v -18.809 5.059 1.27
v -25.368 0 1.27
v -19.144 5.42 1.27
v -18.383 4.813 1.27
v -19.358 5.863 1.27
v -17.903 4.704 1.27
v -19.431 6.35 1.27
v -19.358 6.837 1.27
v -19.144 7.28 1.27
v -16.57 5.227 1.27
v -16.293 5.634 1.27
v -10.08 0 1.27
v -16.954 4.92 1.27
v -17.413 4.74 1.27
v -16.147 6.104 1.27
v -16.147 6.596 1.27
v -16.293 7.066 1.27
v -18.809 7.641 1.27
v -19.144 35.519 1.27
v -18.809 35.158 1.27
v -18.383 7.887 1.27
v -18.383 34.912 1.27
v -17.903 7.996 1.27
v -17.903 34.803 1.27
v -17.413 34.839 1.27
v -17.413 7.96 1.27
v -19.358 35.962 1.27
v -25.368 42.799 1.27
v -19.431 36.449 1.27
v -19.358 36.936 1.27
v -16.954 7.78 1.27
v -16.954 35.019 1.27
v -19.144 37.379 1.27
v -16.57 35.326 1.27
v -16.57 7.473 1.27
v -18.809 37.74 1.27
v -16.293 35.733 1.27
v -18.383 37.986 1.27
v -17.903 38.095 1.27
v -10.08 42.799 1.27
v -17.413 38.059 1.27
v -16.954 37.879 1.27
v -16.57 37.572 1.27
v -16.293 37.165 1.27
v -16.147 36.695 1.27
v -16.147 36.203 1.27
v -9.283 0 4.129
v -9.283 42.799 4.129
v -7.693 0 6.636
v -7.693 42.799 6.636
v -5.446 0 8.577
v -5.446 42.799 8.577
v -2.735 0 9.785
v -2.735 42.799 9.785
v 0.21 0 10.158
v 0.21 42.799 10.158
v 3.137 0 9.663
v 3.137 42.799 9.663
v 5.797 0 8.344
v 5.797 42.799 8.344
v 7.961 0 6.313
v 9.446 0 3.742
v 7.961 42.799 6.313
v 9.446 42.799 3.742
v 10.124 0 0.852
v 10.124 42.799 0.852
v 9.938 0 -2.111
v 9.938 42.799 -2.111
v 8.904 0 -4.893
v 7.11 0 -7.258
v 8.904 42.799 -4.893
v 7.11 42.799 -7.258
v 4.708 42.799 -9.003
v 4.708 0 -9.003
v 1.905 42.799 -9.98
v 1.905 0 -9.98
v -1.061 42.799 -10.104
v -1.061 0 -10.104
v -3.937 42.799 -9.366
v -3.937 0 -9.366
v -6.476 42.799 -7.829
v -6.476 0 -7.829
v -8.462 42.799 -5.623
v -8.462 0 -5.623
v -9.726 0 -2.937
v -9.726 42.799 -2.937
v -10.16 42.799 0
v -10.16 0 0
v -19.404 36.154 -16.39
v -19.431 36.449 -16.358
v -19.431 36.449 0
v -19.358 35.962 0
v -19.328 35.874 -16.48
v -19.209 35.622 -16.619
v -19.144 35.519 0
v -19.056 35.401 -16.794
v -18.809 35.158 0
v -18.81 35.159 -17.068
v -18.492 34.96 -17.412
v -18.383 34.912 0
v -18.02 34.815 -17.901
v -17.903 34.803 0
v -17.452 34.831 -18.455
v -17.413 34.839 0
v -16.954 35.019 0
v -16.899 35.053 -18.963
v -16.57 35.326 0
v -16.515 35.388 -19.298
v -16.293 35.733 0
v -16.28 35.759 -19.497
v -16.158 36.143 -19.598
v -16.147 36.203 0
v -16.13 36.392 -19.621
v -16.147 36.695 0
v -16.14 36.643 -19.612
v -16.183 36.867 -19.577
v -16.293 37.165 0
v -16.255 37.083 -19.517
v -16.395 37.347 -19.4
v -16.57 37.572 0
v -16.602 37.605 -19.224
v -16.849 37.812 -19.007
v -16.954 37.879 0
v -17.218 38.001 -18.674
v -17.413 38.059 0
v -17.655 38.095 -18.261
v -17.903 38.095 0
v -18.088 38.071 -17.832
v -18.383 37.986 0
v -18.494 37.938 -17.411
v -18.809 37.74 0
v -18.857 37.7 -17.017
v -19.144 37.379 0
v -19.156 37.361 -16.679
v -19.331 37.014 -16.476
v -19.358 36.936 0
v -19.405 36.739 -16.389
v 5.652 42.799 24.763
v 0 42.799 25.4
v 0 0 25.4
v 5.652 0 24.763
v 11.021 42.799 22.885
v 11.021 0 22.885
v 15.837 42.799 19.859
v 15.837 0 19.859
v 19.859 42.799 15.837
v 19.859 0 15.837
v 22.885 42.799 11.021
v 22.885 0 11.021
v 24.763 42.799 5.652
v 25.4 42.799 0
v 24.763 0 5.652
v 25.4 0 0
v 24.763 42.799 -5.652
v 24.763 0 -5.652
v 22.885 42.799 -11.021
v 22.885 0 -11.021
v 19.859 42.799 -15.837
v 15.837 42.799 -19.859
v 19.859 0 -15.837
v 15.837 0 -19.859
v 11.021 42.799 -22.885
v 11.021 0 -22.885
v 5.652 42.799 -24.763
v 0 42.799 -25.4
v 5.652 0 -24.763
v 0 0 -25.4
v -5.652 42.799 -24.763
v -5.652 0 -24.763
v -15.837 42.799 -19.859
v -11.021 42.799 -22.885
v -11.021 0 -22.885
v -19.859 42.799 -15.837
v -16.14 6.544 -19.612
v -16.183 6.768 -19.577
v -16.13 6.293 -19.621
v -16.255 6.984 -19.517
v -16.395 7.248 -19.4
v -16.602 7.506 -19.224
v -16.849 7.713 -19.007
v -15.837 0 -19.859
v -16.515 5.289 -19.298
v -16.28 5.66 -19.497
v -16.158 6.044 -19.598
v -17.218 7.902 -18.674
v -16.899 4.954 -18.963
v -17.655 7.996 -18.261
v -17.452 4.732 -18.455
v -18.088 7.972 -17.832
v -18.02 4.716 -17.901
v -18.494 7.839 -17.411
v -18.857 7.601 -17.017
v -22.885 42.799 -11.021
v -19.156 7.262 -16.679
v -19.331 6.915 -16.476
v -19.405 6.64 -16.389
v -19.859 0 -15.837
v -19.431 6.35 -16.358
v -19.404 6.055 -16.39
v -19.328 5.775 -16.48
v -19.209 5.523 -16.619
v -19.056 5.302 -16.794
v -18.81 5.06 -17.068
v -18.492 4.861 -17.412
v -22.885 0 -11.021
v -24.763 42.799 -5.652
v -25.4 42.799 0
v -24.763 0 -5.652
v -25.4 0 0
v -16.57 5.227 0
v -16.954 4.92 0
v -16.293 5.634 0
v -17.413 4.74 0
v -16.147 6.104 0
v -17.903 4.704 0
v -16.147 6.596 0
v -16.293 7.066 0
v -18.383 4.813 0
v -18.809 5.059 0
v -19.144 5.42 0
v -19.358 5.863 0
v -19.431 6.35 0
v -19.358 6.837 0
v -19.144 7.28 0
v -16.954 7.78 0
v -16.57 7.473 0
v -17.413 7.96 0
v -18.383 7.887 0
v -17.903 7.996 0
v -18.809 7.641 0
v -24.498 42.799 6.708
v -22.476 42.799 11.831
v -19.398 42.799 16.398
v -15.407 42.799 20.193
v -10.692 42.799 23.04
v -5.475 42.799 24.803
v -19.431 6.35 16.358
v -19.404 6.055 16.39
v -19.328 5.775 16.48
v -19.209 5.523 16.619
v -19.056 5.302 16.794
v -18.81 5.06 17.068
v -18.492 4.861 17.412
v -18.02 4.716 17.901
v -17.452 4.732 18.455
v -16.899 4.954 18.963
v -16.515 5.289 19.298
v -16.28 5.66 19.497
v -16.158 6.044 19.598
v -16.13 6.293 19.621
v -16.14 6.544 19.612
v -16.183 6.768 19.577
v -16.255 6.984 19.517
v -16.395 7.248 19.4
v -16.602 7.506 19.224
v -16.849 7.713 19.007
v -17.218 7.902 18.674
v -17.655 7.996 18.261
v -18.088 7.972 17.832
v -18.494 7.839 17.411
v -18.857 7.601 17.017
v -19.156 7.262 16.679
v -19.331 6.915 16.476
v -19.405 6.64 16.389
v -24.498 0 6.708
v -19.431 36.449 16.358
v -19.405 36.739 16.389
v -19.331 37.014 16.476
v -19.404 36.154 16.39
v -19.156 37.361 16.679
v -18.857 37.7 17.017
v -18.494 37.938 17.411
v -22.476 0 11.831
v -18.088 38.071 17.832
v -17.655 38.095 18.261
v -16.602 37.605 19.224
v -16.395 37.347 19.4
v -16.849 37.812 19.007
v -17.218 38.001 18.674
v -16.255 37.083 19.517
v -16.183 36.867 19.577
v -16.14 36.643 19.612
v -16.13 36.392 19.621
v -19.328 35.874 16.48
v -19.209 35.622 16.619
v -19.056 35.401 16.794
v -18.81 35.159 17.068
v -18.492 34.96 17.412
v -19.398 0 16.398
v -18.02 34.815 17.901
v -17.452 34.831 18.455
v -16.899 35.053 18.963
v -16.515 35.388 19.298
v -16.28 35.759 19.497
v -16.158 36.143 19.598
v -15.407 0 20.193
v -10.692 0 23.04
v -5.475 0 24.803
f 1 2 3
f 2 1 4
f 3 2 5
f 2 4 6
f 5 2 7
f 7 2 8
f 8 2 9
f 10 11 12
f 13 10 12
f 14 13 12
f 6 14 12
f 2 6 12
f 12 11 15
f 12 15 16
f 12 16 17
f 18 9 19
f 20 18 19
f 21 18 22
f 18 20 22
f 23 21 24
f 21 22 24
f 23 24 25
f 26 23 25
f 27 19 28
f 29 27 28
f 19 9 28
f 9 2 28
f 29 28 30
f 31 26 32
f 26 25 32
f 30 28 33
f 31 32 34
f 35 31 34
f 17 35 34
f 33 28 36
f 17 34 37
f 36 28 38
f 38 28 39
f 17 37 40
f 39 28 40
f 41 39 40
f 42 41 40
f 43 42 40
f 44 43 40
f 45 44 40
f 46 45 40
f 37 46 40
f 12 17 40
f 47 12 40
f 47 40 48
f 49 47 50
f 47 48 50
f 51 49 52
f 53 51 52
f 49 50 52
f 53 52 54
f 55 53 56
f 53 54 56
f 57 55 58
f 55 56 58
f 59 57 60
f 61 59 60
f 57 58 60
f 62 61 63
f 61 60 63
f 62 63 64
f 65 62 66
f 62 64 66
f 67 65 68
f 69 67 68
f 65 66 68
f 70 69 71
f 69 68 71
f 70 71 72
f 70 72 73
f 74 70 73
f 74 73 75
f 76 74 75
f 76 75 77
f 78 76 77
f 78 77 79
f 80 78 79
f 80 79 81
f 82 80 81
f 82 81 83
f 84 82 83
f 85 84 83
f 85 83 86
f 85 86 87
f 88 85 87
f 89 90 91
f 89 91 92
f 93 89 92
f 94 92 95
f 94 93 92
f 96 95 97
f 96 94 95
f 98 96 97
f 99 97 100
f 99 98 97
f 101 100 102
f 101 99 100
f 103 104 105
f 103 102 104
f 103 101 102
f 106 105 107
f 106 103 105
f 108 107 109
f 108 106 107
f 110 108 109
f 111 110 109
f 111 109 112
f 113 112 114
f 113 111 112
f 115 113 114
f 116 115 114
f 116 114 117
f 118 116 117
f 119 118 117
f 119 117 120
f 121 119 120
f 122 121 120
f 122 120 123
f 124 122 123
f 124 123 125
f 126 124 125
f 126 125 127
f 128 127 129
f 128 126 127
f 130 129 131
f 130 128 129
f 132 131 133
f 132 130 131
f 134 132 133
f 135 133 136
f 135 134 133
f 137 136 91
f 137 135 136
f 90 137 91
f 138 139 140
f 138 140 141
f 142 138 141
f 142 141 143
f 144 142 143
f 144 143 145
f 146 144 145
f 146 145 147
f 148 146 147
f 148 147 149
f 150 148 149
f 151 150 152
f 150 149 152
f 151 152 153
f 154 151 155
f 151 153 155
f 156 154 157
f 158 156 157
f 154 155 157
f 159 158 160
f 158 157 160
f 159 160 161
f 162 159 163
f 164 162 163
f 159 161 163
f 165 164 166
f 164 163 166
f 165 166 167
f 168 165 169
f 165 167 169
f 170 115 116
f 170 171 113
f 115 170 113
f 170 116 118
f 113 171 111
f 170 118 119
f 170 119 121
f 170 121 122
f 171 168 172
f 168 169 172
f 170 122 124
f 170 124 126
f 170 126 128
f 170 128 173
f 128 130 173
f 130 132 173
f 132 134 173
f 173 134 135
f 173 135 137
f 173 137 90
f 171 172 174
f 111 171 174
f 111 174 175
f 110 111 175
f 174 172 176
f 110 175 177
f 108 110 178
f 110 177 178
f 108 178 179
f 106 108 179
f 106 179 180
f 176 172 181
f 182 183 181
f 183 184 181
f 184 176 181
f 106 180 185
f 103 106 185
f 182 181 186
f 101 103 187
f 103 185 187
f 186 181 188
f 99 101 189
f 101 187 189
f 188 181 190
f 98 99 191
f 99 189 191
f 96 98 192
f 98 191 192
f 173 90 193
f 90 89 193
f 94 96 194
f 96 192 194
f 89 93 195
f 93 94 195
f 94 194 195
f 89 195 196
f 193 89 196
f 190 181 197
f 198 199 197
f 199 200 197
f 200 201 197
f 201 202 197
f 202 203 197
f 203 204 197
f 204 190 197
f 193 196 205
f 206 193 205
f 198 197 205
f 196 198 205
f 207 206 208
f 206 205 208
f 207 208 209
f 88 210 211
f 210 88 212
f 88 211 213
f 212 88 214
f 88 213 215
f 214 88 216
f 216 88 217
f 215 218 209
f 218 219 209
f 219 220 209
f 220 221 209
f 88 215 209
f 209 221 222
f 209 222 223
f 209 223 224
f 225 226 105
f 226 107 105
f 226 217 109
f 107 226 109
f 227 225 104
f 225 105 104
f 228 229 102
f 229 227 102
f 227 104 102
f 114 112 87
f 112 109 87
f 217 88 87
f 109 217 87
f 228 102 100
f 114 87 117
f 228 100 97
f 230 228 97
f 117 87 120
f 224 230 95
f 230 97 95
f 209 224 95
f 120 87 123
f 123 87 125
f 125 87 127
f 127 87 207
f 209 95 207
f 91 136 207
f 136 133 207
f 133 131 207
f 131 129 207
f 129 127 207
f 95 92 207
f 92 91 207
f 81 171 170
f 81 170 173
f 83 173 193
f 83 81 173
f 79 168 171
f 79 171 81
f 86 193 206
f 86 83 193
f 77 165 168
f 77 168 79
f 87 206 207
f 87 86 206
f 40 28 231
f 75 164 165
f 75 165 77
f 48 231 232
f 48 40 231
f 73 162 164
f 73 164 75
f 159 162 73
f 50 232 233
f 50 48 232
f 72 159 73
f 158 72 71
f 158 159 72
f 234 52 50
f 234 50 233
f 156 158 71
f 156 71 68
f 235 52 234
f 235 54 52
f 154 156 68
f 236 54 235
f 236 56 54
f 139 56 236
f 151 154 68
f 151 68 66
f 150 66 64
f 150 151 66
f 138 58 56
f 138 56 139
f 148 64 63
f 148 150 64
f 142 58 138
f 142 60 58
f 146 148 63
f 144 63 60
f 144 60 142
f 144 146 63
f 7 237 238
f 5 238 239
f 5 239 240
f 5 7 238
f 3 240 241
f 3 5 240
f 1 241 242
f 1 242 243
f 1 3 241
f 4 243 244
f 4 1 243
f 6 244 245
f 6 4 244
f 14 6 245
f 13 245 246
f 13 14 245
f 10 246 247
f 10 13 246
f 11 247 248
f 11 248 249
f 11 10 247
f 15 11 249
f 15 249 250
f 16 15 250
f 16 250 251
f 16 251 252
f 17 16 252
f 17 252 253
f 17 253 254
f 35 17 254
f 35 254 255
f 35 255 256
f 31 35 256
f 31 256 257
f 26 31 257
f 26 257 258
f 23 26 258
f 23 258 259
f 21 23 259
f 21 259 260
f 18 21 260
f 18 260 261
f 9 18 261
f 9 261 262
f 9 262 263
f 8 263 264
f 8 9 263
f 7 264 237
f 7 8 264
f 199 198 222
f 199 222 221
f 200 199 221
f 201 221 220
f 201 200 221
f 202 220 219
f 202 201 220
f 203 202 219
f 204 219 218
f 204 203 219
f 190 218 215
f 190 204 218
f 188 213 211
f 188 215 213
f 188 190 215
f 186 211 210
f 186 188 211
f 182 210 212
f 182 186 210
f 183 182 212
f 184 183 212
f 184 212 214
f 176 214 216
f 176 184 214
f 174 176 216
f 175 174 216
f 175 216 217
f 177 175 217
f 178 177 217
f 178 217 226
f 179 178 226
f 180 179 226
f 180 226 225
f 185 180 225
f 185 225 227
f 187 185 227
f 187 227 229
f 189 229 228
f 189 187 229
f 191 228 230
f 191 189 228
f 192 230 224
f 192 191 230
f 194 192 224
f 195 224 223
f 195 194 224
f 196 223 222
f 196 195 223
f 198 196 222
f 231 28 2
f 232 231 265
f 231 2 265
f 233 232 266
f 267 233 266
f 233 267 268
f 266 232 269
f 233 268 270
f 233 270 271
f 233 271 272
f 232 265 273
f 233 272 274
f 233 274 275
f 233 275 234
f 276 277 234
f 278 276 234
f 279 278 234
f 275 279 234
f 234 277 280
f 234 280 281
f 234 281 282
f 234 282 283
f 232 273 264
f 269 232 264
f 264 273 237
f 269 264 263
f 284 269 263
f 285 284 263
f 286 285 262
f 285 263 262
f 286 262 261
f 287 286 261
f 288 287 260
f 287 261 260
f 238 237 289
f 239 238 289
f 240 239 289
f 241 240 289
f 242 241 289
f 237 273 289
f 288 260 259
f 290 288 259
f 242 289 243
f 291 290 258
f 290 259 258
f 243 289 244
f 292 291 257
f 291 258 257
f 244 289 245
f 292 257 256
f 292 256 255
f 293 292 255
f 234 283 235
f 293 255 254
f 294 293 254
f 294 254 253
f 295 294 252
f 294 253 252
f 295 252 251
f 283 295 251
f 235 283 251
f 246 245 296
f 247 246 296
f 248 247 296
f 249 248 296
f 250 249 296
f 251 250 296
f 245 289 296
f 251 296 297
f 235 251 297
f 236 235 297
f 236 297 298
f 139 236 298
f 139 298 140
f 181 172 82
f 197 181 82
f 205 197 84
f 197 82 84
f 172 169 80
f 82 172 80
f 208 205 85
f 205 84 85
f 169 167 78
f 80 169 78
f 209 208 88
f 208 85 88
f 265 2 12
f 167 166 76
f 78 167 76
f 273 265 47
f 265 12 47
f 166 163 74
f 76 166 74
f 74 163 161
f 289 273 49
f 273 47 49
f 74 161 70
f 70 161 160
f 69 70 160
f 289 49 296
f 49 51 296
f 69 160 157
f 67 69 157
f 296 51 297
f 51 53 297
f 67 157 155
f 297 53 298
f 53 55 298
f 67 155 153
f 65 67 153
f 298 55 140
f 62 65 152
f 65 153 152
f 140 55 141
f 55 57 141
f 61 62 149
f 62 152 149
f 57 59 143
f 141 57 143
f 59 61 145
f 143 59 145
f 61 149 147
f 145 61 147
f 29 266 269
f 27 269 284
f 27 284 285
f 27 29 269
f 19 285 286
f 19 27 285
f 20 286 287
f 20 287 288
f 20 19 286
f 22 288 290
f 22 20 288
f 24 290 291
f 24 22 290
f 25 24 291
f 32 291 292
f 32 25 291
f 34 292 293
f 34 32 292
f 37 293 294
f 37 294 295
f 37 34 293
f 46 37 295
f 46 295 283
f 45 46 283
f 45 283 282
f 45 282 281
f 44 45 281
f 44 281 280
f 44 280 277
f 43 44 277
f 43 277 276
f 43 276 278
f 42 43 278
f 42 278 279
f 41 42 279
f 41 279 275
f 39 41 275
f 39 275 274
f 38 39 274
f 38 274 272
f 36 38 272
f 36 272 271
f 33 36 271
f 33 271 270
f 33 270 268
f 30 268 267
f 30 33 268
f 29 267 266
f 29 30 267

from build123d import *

# Parameters (mm, degrees)
SKETCH1_R               = 25.4
BOSS_EXTRUDE1_DEPTH     = 42.799
CUT_EXTRUDE1_DEPTH      = 56.875525957
CUT_EXTRUDE2_DEPTH      = 72.116484735
CUT_EXTRUDE2_DEPTH_BACK = 72.116484735
SKETCH3_R               = 1.651


with BuildPart() as part:
    # Sketch1 → Boss-Extrude1 (new body)
    with BuildSketch(Plane(origin=(0, 0, 0), x_dir=(1, 0, 0), z_dir=(0, 1, 0))):
        Circle(SKETCH1_R)
    extrude(amount=BOSS_EXTRUDE1_DEPTH)

    # Sketch2 → Cut-Extrude1 (cut, through all)
    with BuildSketch(Plane(origin=(0, 42.799, 0), x_dir=(1, 0, 0), z_dir=(0, 1, 0))):
        with BuildLine():
            Line((-10.16, 0), (-25.4, 0))
            ThreePointArc((-25.4, 0), (-25.392056291, -0.635198655), (-25.368230131, -1.27))
            Line((-25.368230131, -1.27), (-10.080312495, -1.27))
            ThreePointArc((-10.080312495, -1.27), (10.140058554, 0.636248791), (-10.16, 0))
        make_face()
    extrude(amount=-CUT_EXTRUDE1_DEPTH, mode=Mode.SUBTRACT)

    # Sketch3 → Cut-Extrude2 (cut, two sides: drawn at the far end of the back side and taken through both)
    with BuildSketch(Plane.XY.offset(-25.4).offset(-CUT_EXTRUDE2_DEPTH_BACK)):
        with Locations((-17.78, 36.449)):
            Circle(SKETCH3_R)
        with Locations((-17.78, 6.35)):
            Circle(SKETCH3_R)
    extrude(amount=CUT_EXTRUDE2_DEPTH + CUT_EXTRUDE2_DEPTH_BACK, mode=Mode.SUBTRACT)


solid = part.part
